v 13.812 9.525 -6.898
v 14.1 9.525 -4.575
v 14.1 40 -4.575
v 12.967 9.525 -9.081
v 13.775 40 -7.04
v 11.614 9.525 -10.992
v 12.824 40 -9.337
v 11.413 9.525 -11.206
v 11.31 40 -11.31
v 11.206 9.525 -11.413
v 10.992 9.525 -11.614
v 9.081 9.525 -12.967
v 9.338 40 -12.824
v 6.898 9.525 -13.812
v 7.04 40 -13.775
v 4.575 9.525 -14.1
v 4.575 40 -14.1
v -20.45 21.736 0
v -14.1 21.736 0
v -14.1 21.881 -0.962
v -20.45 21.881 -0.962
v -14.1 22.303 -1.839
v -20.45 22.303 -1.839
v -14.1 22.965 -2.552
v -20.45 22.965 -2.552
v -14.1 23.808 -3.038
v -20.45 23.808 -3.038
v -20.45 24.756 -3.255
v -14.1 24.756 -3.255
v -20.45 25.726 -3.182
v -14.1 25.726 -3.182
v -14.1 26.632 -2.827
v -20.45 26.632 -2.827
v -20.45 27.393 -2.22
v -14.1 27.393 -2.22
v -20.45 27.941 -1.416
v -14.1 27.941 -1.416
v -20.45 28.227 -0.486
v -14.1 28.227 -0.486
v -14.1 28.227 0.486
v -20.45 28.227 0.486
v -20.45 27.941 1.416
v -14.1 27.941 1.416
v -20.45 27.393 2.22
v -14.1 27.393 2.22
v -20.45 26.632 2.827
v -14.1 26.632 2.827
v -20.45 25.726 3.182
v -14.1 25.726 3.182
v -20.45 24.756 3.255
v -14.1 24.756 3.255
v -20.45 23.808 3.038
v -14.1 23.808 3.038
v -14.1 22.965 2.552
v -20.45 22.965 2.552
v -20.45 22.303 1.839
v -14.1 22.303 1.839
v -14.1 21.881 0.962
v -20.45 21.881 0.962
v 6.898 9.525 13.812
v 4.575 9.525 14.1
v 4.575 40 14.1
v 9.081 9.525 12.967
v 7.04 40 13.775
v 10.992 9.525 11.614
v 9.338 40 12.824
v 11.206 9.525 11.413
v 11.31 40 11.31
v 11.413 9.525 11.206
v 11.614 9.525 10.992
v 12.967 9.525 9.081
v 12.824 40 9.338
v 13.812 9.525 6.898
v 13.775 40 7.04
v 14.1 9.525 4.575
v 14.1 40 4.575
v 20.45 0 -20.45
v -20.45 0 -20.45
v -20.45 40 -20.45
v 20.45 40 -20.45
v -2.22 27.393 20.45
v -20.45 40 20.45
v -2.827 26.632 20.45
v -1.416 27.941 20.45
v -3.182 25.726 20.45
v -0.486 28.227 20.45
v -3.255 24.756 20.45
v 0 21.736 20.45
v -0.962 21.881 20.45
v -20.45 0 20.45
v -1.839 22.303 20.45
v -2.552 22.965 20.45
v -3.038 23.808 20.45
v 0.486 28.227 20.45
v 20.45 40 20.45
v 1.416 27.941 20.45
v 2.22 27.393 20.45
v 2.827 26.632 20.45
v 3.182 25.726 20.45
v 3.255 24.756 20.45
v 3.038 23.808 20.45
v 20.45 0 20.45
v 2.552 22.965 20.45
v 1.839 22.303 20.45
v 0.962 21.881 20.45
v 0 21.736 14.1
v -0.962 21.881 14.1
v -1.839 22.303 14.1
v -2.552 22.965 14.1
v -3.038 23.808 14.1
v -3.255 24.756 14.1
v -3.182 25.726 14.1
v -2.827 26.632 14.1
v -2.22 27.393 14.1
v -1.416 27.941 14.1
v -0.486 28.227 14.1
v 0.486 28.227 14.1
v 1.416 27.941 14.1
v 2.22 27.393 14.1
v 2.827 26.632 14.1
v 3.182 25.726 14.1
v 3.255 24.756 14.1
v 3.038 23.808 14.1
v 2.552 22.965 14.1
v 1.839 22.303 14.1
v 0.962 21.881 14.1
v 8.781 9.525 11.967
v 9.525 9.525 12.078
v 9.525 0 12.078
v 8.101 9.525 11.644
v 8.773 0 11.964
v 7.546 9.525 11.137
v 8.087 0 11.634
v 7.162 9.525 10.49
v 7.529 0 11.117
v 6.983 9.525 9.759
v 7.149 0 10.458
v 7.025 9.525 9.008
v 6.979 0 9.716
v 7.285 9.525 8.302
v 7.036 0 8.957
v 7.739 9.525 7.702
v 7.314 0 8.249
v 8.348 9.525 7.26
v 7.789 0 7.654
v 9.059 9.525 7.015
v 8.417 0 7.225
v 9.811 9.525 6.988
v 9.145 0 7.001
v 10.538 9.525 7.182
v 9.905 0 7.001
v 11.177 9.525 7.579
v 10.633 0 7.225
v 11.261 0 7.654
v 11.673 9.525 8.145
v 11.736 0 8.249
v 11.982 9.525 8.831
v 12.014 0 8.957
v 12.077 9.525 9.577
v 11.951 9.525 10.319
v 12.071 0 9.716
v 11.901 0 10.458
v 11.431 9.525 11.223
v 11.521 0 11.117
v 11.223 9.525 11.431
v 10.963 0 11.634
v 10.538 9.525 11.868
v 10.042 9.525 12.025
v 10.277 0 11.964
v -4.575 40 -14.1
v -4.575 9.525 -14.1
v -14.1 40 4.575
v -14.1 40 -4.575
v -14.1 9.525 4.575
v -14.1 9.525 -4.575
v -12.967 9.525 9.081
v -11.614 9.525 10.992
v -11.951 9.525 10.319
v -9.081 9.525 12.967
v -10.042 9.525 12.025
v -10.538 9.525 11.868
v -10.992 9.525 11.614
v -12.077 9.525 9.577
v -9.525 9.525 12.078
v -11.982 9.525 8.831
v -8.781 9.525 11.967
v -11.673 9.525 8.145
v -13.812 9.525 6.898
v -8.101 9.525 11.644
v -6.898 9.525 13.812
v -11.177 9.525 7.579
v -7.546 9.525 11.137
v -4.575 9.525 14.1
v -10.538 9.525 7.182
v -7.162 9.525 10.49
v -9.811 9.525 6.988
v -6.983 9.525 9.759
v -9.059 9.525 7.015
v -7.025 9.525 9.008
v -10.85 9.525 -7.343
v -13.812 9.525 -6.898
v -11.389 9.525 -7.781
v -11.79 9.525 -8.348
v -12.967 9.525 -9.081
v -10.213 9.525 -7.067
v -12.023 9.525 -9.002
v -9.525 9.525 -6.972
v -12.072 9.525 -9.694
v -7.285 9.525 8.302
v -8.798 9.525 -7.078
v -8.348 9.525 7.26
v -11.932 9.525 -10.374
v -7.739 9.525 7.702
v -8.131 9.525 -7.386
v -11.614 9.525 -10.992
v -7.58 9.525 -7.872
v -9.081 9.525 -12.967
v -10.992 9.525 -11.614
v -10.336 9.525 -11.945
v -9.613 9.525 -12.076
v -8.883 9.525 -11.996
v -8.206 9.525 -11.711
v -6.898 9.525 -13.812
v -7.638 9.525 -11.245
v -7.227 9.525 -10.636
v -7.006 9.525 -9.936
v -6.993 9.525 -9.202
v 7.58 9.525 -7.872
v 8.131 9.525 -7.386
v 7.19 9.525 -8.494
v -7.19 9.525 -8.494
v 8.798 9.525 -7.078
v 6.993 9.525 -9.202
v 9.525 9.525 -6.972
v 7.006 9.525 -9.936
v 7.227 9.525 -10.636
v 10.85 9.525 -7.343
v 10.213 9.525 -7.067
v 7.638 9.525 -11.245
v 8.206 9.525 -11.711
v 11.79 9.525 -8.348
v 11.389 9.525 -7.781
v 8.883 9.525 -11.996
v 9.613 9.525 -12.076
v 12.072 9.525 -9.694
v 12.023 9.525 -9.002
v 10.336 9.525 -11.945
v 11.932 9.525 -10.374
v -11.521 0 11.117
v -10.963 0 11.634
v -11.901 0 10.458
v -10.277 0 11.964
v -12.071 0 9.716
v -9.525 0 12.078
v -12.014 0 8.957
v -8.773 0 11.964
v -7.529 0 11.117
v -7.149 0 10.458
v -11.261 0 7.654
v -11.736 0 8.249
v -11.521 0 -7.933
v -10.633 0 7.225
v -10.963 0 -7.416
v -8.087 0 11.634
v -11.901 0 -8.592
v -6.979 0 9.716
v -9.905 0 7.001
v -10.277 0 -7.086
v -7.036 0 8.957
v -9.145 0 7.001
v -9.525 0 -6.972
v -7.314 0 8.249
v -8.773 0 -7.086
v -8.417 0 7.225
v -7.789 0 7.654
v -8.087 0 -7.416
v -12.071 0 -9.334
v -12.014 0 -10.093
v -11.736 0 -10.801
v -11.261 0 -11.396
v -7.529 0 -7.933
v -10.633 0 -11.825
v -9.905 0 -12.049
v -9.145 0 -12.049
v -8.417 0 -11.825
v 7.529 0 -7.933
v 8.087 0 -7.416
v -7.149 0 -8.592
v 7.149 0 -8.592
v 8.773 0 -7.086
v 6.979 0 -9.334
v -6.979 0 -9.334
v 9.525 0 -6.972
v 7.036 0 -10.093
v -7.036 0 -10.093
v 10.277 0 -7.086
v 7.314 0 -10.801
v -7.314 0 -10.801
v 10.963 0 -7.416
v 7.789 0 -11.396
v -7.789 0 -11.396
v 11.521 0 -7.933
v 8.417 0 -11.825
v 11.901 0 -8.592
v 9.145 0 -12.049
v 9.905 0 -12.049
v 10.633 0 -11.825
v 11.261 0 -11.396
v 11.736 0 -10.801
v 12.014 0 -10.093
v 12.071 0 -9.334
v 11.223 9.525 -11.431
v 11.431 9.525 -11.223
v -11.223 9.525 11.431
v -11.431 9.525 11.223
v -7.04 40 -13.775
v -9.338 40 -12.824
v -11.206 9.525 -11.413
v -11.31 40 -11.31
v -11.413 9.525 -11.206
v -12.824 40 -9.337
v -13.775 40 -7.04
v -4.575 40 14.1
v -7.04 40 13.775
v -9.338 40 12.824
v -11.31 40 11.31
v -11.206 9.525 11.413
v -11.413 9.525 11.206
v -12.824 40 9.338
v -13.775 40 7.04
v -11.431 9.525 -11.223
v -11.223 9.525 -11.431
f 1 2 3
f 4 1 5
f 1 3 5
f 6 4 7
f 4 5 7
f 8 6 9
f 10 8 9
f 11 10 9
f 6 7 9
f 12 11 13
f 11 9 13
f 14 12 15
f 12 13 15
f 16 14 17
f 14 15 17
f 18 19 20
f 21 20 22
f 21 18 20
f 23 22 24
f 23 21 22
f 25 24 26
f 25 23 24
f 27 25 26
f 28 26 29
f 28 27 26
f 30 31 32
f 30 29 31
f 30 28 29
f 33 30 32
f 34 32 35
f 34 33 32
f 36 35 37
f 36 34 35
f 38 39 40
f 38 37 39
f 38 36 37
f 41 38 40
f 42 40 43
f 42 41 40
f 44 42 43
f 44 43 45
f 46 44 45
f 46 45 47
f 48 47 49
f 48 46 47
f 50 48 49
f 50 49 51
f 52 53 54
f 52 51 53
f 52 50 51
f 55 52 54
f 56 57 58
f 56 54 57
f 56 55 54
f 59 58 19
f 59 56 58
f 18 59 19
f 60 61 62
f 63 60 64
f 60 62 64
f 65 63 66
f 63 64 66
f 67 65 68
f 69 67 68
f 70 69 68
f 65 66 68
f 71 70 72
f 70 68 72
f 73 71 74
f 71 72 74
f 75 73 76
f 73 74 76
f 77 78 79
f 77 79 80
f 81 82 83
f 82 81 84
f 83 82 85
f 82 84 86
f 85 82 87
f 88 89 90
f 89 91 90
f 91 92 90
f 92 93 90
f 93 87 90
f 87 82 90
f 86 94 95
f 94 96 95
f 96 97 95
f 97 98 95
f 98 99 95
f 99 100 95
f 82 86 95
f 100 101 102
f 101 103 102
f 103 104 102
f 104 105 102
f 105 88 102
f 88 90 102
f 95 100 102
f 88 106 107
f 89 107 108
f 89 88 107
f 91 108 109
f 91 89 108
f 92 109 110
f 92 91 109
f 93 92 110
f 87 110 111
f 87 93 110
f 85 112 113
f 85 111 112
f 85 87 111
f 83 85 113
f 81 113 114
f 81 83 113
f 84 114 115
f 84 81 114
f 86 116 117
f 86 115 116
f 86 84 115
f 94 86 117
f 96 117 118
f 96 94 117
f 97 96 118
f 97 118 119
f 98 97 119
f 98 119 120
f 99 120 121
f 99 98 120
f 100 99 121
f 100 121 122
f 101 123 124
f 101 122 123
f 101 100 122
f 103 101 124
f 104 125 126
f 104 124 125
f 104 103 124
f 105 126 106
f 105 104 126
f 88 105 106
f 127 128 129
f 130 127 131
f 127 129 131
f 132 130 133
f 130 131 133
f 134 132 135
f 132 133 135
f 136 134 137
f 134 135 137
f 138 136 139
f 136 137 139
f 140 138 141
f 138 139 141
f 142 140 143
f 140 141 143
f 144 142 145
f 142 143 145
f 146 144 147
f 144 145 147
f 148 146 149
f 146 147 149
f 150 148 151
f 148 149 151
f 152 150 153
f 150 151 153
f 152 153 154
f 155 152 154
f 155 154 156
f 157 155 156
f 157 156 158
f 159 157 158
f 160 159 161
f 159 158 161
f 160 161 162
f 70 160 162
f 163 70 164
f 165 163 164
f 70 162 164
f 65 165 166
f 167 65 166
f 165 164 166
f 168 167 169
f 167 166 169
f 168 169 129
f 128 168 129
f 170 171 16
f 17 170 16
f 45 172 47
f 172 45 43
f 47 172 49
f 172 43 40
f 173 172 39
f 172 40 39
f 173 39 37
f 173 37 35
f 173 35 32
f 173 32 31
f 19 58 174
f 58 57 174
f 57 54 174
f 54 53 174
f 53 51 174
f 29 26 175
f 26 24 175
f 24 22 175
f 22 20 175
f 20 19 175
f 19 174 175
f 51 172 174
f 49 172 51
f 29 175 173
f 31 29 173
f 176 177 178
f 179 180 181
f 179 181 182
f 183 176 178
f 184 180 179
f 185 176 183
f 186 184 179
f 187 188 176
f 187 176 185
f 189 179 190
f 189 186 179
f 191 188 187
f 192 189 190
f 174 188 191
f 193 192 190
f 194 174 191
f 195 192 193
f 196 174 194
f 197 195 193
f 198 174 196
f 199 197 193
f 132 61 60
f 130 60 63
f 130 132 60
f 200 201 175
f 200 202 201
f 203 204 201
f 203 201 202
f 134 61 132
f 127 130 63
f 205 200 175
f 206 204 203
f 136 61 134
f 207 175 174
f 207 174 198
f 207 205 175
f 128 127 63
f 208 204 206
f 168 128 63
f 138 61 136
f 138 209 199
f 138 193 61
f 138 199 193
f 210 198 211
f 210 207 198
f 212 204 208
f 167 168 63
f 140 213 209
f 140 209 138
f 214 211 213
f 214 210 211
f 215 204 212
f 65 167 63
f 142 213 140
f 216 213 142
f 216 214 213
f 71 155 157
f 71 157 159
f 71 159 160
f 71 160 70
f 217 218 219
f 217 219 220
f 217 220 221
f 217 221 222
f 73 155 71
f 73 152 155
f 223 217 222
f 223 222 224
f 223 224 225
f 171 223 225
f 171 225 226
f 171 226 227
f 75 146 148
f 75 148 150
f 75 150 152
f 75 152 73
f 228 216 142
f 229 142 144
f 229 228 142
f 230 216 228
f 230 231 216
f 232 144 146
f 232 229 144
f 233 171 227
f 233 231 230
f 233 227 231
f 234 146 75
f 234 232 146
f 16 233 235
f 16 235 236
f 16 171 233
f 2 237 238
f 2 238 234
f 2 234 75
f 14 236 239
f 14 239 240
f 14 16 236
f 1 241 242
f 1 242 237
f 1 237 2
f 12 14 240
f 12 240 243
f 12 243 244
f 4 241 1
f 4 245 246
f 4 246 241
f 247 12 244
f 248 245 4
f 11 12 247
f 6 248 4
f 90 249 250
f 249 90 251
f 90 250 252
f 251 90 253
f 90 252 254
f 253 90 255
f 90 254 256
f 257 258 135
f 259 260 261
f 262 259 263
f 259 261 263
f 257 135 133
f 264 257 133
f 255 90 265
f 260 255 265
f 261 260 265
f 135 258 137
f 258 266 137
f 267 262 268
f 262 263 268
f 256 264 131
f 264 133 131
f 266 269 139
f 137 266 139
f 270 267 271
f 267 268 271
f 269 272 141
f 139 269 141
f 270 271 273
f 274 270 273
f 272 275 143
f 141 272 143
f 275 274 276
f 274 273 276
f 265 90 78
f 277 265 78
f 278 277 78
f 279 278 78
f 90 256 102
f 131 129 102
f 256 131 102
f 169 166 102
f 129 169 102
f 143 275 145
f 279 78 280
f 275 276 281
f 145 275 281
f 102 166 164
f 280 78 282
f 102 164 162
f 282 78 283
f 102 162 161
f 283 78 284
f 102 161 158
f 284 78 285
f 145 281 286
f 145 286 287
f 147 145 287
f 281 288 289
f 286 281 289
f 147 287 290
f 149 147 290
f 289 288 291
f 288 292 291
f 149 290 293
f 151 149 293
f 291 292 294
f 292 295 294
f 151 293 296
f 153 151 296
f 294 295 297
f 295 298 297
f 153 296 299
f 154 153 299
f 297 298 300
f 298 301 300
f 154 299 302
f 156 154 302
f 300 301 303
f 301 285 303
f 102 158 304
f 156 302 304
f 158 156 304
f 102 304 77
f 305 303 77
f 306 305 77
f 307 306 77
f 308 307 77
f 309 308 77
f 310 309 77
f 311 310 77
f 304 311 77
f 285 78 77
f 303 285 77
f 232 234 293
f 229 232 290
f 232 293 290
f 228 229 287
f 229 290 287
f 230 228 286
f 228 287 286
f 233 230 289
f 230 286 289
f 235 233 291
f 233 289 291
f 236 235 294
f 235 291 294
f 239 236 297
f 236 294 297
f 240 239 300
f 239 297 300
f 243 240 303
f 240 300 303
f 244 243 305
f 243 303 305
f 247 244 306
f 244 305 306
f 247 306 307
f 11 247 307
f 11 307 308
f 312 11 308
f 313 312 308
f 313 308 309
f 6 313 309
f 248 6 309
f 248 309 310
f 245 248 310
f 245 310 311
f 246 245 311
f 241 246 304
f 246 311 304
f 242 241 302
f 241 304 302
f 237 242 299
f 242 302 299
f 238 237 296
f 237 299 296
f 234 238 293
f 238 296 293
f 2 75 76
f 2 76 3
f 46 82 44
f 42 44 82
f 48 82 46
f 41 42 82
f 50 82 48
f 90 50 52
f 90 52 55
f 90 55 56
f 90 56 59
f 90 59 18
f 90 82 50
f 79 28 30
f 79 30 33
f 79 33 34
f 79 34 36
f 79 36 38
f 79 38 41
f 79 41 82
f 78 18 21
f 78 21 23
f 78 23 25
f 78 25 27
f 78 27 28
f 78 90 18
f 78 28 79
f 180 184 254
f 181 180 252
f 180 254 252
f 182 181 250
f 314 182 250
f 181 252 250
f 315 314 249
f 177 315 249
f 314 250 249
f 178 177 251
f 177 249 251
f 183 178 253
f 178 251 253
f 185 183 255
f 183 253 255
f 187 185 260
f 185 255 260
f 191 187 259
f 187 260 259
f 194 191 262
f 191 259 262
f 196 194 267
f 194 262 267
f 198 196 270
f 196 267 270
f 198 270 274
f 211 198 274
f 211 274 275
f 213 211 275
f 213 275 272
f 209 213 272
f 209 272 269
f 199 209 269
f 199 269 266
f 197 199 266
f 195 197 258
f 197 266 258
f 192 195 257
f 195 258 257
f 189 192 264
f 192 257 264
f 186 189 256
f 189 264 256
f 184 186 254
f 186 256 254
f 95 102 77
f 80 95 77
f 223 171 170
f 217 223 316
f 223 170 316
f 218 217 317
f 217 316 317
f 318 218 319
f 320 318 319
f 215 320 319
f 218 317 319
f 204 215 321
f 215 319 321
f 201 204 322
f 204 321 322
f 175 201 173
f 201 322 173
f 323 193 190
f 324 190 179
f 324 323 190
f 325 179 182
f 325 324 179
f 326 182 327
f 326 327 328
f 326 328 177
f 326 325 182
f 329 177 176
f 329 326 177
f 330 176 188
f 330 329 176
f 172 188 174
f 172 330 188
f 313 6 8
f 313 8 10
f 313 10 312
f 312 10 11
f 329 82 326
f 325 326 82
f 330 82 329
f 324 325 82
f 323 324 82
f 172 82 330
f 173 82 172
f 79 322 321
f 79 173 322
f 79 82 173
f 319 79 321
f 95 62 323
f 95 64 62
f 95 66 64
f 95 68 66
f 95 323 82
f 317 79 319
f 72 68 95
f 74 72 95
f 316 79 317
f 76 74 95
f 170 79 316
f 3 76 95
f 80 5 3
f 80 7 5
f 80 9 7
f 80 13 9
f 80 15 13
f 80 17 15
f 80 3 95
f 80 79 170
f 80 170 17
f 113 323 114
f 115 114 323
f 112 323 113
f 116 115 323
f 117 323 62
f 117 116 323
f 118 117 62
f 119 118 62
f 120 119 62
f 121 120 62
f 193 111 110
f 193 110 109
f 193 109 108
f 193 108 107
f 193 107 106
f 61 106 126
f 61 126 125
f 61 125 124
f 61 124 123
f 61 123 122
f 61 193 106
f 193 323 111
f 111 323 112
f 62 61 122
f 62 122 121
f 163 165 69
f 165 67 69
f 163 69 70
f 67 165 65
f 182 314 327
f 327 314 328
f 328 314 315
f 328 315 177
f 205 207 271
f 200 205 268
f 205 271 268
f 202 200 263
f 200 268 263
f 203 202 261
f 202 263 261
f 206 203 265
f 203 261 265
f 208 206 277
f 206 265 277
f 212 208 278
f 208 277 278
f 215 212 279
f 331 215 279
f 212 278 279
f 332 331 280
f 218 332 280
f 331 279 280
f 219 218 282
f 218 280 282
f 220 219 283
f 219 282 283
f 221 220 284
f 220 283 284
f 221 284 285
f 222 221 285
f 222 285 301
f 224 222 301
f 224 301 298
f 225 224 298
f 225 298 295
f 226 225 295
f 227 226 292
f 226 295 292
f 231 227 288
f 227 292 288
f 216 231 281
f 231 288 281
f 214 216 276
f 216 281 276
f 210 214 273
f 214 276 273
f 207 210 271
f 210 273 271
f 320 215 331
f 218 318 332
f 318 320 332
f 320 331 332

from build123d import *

# Parameters (mm, degrees)
SKETCH1_W                        = 40.9
SKETCH1_H                        = 40.9
BOSS_EXTRUDE1_DEPTH              = 40
CUT_EXTRUDE1_START               = -30.475
SKETCH3_W                        = 28.2
SKETCH3_H                        = 28.2
CUT_EXTRUDE1_DEPTH               = 30.475
FILLET1_R                        = 9.525
CIRPATTERN1_COUNT                = 2
CIRPATTERN1_ANGLE                = 90
SKETCH6_W                        = 2.5527
SKETCH6_H                        = 9.525
F_1_4_20_TAPPED_HOLE1_AT_2_COUNT = 2
F_1_4_20_TAPPED_HOLE1_AT_2_PITCH = 19.05
F_1_4_20_TAPPED_HOLE1_AT_3_COUNT = 2
F_1_4_20_TAPPED_HOLE1_AT_3_PITCH = 26.940768363
F_1_4_20_TAPPED_HOLE1_AT_4_COUNT = 2
F_1_4_20_TAPPED_HOLE1_AT_4_PITCH = 19.05


with BuildPart() as part:
    # Sketch1 → Boss-Extrude1 (new body)
    with BuildSketch(Plane(origin=(0, 0, 0), x_dir=(1, 0, 0), z_dir=(0, 1, 0))):
        Rectangle(SKETCH1_W, SKETCH1_H)
    extrude(amount=BOSS_EXTRUDE1_DEPTH)

    # Sketch3 → Cut-Extrude1 (cut)
    with BuildSketch(Plane(origin=(0, 40, 0), x_dir=(1, 0, 0), z_dir=(0, 1, 0)).offset(CUT_EXTRUDE1_START)):
        Rectangle(SKETCH3_W, SKETCH3_H)
    extrude(amount=CUT_EXTRUDE1_DEPTH, mode=Mode.SUBTRACT)

    # Fillet1
    fillet1_edges = [part.edges().sort_by_distance(p)[0] for p in [
        (14.1, 24.7625, 14.1),
        (14.1, 24.7625, -14.1),
        (-14.1, 24.7625, -14.1),
        (-14.1, 24.7625, 14.1),
    ]]
    fillet(fillet1_edges, radius=FILLET1_R)

    # Sketch4 → 5/16-18 Tapped Hole1 (revolve, cut)
    with BuildSketch(Plane(origin=(0, 25, 20.45), x_dir=(0, -1, 0), z_dir=(1, 0, 0))):
        Polygon((0, 0), (0, 24.884648974), (3.2639, 22.9235), (3.2639, 0), align=None)
    f_5_16_18_tapped_hole1 = revolve(axis=Axis((0, 25, 26.8), (0, 0, -1)), mode=Mode.SUBTRACT)

    # CirPattern1: 5/16-18 Tapped Hole1 ×2 about axis
    cirpattern1_axis = Axis((0, -2, 0), (0, -1, 0))
    for i in range(1, CIRPATTERN1_COUNT):
        add(f_5_16_18_tapped_hole1.rotate(cirpattern1_axis, i * CIRPATTERN1_ANGLE / (CIRPATTERN1_COUNT - 1)), mode=Mode.SUBTRACT)

    # Sketch6 → 1/4-20 Tapped Hole1 (revolve, cut)
    with BuildSketch(Plane(origin=(-9.525, 9.525, -9.525), x_dir=(0, 0, 1), z_dir=(1, 0, 0))):
        with Locations((1.27635, 4.7625)):
            Rectangle(SKETCH6_W, SKETCH6_H)
    f_1_4_20_tapped_hole1 = revolve(axis=Axis((-9.525, 15.875, -9.525), (0, -1, 0)), mode=Mode.SUBTRACT)

    # 1/4-20 Tapped Hole1 at 2: 1/4-20 Tapped Hole1 ×2
    with Locations(*[(i * F_1_4_20_TAPPED_HOLE1_AT_2_PITCH, 0, 0) for i in range(1, F_1_4_20_TAPPED_HOLE1_AT_2_COUNT)]):
        add(f_1_4_20_tapped_hole1, mode=Mode.SUBTRACT)

    # 1/4-20 Tapped Hole1 at 3: 1/4-20 Tapped Hole1 ×2
    with Locations(*[Vector(0.7071067811865476, 0, 0.7071067811865475) * (i * F_1_4_20_TAPPED_HOLE1_AT_3_PITCH) for i in range(1, F_1_4_20_TAPPED_HOLE1_AT_3_COUNT)]):
        add(f_1_4_20_tapped_hole1, mode=Mode.SUBTRACT)

    # 1/4-20 Tapped Hole1 at 4: 1/4-20 Tapped Hole1 ×2
    with Locations(*[(0, 0, i * F_1_4_20_TAPPED_HOLE1_AT_4_PITCH) for i in range(1, F_1_4_20_TAPPED_HOLE1_AT_4_COUNT)]):
        add(f_1_4_20_tapped_hole1, mode=Mode.SUBTRACT)


solid = part.part
